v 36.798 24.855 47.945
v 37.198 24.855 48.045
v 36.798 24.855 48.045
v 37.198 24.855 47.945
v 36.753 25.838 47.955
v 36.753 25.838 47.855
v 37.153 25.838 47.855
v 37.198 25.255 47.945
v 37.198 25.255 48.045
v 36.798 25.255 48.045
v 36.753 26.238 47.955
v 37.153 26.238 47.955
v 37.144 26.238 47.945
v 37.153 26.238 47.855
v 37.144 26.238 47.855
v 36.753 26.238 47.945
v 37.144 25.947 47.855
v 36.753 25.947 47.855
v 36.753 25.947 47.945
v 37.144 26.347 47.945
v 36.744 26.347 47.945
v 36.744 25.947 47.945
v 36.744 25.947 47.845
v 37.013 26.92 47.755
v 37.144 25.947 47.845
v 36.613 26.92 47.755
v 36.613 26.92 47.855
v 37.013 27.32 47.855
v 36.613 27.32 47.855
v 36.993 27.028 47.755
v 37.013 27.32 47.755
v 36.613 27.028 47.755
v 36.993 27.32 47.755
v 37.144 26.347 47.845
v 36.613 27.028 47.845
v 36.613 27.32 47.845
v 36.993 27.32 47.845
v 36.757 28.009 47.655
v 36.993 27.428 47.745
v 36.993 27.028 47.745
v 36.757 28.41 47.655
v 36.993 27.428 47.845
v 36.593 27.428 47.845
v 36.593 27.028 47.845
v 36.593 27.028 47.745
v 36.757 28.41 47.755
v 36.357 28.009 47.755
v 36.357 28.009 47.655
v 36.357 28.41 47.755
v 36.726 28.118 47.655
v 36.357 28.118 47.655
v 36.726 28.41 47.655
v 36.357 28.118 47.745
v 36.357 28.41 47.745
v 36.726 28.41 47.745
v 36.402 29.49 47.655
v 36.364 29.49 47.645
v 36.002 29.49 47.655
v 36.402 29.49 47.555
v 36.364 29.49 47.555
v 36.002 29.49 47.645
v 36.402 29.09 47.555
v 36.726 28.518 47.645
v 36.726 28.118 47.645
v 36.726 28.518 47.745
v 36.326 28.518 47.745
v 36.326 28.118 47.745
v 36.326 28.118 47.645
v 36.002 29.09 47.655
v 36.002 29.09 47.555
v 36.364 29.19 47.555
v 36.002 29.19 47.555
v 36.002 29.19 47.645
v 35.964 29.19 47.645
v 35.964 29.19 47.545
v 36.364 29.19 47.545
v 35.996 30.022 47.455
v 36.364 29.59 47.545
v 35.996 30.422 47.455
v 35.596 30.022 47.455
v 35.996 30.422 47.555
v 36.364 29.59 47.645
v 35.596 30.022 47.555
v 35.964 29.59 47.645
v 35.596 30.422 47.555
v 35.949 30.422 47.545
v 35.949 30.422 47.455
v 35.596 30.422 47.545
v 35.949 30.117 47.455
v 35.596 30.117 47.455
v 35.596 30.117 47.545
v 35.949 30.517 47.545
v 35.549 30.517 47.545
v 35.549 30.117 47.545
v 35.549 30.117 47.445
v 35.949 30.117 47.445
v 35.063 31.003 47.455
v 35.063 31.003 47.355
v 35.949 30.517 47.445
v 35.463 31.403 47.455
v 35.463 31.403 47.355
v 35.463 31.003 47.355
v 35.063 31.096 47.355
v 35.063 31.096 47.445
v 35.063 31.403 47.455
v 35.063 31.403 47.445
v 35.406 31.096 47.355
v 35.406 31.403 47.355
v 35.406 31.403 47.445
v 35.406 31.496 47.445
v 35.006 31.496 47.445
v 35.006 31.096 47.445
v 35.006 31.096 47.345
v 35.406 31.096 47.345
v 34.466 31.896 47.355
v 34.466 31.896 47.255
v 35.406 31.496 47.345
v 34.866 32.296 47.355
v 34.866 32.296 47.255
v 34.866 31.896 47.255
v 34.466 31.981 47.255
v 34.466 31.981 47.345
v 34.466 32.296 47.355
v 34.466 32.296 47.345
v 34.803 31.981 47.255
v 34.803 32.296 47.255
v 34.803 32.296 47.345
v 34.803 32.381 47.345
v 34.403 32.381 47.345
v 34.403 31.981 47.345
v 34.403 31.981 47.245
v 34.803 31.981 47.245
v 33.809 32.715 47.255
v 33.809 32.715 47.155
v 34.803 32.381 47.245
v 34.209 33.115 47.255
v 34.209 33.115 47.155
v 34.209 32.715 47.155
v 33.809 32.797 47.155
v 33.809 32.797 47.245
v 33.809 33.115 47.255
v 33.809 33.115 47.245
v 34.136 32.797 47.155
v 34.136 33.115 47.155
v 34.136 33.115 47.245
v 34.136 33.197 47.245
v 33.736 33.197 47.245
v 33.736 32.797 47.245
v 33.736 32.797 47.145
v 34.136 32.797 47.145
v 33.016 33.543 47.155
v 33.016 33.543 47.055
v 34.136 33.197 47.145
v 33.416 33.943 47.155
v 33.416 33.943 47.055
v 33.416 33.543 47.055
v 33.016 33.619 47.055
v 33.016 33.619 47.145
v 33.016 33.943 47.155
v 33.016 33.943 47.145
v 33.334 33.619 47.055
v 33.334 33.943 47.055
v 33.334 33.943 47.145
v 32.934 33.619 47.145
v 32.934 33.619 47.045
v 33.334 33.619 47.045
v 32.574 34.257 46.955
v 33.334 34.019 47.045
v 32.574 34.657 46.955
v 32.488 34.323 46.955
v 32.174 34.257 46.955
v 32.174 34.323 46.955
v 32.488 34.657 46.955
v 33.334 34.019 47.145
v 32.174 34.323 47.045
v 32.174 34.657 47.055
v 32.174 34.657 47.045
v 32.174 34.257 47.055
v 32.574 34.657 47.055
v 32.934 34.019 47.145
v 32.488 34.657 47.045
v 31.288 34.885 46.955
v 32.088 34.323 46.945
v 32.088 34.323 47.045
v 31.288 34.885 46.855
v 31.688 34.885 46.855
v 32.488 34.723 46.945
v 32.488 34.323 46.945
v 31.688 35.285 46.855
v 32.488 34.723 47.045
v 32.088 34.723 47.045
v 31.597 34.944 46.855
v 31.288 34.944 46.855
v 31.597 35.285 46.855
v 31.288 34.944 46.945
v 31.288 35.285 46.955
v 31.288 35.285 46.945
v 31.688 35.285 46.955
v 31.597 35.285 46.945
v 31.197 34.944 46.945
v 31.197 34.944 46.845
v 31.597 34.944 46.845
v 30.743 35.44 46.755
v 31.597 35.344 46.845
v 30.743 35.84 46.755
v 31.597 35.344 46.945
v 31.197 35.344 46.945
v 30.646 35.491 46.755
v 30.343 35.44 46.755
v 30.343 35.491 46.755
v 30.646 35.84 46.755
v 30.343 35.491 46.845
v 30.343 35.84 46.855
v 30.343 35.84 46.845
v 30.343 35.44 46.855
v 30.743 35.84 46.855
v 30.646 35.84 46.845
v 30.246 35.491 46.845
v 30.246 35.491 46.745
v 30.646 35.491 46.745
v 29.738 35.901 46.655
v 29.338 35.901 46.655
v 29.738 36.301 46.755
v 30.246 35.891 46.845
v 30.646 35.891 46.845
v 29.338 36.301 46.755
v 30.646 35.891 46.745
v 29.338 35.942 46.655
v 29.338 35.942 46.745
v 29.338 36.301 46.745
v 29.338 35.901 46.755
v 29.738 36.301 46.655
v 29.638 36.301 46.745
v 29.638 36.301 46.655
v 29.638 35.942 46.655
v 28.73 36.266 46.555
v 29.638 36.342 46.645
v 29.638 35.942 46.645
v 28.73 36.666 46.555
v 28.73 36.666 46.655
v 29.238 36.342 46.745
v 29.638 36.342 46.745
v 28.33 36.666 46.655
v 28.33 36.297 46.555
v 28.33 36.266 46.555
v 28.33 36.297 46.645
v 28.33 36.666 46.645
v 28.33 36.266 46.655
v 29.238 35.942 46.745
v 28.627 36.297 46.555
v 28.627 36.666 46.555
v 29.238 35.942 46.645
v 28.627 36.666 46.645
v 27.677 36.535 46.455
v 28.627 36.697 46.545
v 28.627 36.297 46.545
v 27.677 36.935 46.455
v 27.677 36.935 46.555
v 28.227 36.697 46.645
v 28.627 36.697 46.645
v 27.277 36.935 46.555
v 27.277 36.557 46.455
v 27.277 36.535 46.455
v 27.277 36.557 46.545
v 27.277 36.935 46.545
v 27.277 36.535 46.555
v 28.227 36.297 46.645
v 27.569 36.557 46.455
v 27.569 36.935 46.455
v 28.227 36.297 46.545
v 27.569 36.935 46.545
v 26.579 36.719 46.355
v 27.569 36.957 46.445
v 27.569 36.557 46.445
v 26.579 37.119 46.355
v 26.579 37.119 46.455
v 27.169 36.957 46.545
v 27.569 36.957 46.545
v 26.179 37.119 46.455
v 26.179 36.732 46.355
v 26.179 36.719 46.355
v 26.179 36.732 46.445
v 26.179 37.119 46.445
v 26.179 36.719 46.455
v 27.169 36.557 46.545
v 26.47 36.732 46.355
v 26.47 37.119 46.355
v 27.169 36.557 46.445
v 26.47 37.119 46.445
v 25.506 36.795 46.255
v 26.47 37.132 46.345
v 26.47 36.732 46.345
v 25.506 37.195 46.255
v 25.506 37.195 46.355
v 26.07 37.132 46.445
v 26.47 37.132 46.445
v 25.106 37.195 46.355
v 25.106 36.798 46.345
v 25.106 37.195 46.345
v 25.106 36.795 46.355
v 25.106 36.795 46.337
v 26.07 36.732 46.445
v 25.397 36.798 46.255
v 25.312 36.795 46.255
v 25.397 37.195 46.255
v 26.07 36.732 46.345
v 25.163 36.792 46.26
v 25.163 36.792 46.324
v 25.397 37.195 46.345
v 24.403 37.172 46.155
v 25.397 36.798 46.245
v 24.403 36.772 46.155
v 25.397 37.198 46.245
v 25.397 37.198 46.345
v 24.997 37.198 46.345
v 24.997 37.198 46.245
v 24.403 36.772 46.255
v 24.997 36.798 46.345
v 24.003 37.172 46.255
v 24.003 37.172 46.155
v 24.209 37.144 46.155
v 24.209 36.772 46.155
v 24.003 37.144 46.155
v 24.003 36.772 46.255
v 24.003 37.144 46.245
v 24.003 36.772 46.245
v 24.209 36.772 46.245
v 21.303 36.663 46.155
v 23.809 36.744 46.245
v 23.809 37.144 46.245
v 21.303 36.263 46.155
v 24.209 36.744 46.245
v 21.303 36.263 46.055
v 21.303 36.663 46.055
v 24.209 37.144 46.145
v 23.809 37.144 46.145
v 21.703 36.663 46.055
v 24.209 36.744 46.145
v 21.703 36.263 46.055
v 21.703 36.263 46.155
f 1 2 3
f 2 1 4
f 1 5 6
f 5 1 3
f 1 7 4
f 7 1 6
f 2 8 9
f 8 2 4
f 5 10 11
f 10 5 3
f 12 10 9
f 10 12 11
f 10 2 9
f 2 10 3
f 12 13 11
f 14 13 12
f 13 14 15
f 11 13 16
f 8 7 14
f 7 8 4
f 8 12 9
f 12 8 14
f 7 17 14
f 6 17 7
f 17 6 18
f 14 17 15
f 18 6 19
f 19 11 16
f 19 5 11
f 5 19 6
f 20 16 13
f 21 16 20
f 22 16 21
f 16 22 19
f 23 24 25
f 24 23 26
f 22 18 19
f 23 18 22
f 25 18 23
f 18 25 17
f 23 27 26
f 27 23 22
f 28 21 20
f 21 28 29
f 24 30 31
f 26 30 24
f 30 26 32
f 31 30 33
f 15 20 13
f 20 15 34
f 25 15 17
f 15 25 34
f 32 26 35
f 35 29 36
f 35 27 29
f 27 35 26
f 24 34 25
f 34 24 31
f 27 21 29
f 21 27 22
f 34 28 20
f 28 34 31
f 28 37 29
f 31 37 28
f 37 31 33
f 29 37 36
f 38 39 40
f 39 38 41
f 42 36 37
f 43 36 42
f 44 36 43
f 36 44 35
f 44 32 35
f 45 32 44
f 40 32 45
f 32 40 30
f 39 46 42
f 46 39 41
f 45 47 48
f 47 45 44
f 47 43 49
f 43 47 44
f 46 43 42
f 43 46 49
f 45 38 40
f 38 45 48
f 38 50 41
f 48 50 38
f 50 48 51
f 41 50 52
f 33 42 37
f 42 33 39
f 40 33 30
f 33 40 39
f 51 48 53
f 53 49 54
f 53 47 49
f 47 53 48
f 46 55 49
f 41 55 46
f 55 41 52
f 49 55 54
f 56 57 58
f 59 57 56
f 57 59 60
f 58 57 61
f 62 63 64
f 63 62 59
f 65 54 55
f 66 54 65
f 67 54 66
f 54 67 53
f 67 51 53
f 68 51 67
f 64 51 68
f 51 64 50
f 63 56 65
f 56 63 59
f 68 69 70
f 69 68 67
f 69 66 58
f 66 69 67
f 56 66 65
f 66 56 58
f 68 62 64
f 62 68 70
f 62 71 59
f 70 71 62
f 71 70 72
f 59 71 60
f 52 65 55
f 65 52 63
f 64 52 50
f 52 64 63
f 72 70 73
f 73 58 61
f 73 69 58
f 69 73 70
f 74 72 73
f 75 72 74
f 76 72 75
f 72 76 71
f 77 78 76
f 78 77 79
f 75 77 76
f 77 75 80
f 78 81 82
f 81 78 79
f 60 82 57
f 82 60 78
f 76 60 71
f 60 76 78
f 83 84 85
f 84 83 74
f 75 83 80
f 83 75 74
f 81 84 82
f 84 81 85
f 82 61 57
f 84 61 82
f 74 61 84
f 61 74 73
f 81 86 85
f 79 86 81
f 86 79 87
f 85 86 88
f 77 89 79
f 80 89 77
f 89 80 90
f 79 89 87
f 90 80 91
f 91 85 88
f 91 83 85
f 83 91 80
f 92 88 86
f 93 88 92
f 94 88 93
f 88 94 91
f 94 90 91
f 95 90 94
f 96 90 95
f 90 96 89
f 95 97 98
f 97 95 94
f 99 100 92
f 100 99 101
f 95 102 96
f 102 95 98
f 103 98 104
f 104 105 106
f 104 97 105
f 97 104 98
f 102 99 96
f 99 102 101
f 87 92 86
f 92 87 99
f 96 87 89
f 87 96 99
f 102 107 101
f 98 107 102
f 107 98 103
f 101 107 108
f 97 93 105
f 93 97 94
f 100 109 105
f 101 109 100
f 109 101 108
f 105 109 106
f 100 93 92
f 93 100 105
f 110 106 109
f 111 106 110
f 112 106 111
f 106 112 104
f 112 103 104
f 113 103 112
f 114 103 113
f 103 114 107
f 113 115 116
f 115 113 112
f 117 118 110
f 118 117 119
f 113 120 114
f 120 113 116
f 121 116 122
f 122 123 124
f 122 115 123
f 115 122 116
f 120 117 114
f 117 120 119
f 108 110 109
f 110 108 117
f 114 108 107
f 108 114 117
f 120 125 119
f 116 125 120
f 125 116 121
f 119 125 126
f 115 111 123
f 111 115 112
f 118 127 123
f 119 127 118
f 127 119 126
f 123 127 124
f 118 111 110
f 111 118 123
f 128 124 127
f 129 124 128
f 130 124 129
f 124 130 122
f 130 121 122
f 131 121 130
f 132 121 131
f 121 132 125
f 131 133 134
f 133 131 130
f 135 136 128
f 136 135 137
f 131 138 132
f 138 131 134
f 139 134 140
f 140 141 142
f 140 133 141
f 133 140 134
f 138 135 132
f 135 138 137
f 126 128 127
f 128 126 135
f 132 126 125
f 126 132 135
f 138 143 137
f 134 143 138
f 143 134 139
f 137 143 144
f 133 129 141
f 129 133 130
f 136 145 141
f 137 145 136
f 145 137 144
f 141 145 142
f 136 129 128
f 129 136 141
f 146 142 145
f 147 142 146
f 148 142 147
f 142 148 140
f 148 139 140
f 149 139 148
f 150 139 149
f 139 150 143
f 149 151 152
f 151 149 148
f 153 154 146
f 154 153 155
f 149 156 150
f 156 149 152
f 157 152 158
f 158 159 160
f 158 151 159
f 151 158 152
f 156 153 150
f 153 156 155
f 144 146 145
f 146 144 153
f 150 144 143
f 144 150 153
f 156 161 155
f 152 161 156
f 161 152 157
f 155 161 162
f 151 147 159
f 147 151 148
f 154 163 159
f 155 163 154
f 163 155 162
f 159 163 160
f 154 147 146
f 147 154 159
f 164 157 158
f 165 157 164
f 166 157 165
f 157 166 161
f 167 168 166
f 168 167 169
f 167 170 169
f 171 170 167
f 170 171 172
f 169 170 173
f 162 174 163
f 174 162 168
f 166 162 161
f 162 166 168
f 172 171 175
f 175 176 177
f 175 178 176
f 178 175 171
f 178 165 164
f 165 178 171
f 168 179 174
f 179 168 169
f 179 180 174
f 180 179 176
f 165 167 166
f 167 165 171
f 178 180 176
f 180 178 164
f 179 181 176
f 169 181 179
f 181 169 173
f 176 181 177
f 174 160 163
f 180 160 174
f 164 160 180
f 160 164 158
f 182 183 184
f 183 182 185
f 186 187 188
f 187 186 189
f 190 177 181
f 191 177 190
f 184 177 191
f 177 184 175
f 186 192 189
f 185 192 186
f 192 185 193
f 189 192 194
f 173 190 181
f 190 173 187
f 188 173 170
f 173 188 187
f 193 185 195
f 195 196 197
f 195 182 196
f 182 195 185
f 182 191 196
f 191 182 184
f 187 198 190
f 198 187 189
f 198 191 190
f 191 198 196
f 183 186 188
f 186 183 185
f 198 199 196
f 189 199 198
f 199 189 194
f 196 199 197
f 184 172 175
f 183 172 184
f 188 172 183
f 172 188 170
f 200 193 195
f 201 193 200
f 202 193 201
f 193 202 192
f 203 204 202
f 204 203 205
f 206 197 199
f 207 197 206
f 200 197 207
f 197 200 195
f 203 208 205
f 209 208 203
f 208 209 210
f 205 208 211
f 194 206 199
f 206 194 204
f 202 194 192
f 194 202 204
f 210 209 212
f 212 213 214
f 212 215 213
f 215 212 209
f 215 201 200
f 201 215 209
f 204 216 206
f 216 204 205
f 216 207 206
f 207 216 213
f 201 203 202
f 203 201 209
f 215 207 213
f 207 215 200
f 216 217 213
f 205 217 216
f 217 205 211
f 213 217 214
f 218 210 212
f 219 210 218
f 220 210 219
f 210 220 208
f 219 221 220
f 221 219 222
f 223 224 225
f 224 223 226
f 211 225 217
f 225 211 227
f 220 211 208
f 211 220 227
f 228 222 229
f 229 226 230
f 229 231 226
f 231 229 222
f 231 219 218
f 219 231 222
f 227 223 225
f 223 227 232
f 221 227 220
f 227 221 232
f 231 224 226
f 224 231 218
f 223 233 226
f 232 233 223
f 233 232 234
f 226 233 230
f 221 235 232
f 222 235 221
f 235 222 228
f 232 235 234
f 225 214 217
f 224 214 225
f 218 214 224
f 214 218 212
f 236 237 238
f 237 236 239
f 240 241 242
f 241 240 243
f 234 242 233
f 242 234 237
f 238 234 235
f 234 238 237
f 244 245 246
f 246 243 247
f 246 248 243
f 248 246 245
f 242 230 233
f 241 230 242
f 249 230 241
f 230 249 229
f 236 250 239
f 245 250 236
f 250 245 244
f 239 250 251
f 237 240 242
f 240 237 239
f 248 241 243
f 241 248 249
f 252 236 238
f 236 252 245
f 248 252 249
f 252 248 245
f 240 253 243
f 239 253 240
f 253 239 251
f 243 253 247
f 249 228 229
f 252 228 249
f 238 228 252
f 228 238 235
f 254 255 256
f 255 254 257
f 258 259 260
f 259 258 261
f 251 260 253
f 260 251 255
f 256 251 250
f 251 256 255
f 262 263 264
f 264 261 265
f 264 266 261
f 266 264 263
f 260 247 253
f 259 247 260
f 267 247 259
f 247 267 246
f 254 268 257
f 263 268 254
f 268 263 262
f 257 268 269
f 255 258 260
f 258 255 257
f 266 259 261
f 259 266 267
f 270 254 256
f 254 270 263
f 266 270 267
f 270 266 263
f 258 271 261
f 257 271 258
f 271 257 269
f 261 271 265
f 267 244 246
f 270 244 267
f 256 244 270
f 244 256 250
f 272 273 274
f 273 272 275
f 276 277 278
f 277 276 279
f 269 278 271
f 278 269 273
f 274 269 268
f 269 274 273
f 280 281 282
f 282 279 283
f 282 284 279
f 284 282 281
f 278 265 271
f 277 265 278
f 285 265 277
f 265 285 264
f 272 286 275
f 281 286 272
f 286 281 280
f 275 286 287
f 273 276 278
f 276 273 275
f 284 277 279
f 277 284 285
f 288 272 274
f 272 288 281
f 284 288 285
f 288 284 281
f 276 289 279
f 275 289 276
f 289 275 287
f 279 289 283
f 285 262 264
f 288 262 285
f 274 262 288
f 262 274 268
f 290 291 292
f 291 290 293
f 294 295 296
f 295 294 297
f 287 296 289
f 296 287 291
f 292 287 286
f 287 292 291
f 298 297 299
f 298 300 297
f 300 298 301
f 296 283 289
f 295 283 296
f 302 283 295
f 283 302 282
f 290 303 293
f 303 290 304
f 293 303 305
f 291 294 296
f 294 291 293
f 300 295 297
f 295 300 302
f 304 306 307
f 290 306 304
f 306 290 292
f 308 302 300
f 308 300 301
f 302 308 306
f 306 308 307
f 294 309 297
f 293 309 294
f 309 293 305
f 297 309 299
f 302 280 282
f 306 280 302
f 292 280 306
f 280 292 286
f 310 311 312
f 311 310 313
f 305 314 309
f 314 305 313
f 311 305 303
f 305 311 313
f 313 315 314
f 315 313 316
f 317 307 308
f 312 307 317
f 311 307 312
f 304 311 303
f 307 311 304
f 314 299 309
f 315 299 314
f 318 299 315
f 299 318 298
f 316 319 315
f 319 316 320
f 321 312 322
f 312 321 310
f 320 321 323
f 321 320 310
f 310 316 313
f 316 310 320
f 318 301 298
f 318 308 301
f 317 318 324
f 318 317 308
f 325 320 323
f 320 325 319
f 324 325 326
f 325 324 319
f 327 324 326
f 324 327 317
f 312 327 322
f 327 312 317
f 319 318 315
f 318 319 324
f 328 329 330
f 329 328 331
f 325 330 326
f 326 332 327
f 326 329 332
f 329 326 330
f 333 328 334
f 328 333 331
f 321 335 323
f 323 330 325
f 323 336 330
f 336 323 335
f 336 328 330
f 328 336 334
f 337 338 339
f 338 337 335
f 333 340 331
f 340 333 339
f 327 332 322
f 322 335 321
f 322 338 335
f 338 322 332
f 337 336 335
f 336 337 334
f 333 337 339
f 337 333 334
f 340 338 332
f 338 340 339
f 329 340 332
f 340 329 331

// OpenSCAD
hull() {
    translate([36.997550000000004, 25.054650000000002, 47.995000000000005]) cube([0.4, 0.4, 0.1], center=true);
    translate([36.953450000000004, 26.03835, 47.905]) cube([0.4, 0.4, 0.1], center=true);
}


hull() {
    translate([36.94375, 26.14705, 47.894999999999996]) cube([0.4, 0.4, 0.1], center=true);
    translate([36.81325, 27.119950000000003, 47.80499999999999]) cube([0.4, 0.4, 0.1], center=true);
}


hull() {
    translate([36.792899999999996, 27.228500000000004, 47.794999999999995]) cube([0.4, 0.4, 0.1], center=true);
    translate([36.5571, 28.2095, 47.705000000000005]) cube([0.4, 0.4, 0.1], center=true);
}


hull() {
    translate([36.526, 28.318, 47.69500000000001]) cube([0.4, 0.4, 0.1], center=true);
    translate([36.202, 29.290000000000003, 47.605000000000004]) cube([0.4, 0.4, 0.1], center=true);
}


hull() {
    translate([36.163599999999995, 29.3902, 47.595000000000006]) cube([0.4, 0.4, 0.1], center=true);
    translate([35.796400000000006, 30.2218, 47.505]) cube([0.4, 0.4, 0.1], center=true);
}


hull() {
    translate([35.74900000000001, 30.317200000000003, 47.495]) cube([0.4, 0.4, 0.1], center=true);
    translate([35.263, 31.2028, 47.404999999999994]) cube([0.4, 0.4, 0.1], center=true);
}


hull() {
    translate([35.205999999999996, 31.2964, 47.394999999999996]) cube([0.4, 0.4, 0.1], center=true);
    translate([34.666000000000004, 32.095600000000005, 47.305]) cube([0.4, 0.4, 0.1], center=true);
}


hull() {
    translate([34.603, 32.180800000000005, 47.295]) cube([0.4, 0.4, 0.1], center=true);
    translate([34.009, 32.915200000000006, 47.205000000000005]) cube([0.4, 0.4, 0.1], center=true);
}


hull() {
    translate([33.936, 32.997400000000006, 47.19500000000001]) cube([0.4, 0.4, 0.1], center=true);
    translate([33.216, 33.7426, 47.105000000000004]) cube([0.4, 0.4, 0.1], center=true);
}


hull() {
    translate([33.1338, 33.8194, 47.095]) cube([0.4, 0.4, 0.1], center=true);
    translate([32.3742, 34.4566, 47.005]) cube([0.4, 0.4, 0.1], center=true);
}


hull() {
    translate([32.2876, 34.5232, 46.995000000000005]) cube([0.4, 0.4, 0.1], center=true);
    translate([31.4884, 35.0848, 46.905]) cube([0.4, 0.4, 0.1], center=true);
}


hull() {
    translate([31.3966, 35.1436, 46.895]) cube([0.4, 0.4, 0.1], center=true);
    translate([30.543400000000002, 35.6404, 46.805]) cube([0.4, 0.4, 0.1], center=true);
}


hull() {
    translate([30.4456, 35.690799999999996, 46.794999999999995]) cube([0.4, 0.4, 0.1], center=true);
    translate([29.538400000000003, 36.1012, 46.705]) cube([0.4, 0.4, 0.1], center=true);
}


hull() {
    translate([29.437600000000003, 36.142, 46.695]) cube([0.4, 0.4, 0.1], center=true);
    translate([28.5304, 36.466, 46.605000000000004]) cube([0.4, 0.4, 0.1], center=true);
}


hull() {
    translate([28.427200000000003, 36.4972, 46.595000000000006]) cube([0.4, 0.4, 0.1], center=true);
    translate([27.4768, 36.7348, 46.505]) cube([0.4, 0.4, 0.1], center=true);
}


hull() {
    translate([27.369, 36.757, 46.495000000000005]) cube([0.4, 0.4, 0.1], center=true);
    translate([26.379, 36.919, 46.405]) cube([0.4, 0.4, 0.1], center=true);
}


hull() {
    translate([26.270400000000002, 36.93155, 46.394999999999996]) cube([0.4, 0.4, 0.1], center=true);
    translate([25.305600000000002, 36.995450000000005, 46.305]) cube([0.4, 0.4, 0.1], center=true);
}


hull() {
    translate([25.1968, 36.997600000000006, 46.295]) cube([0.4, 0.4, 0.1], center=true);
    translate([24.2032, 36.9724, 46.205000000000005]) cube([0.4, 0.4, 0.1], center=true);
}


hull() {
    translate([24.0088, 36.94425, 46.19500000000001]) cube([0.4, 0.4, 0.1], center=true);
    translate([21.503200000000003, 36.46275, 46.105000000000004]) cube([0.4, 0.4, 0.1], center=true);
}
